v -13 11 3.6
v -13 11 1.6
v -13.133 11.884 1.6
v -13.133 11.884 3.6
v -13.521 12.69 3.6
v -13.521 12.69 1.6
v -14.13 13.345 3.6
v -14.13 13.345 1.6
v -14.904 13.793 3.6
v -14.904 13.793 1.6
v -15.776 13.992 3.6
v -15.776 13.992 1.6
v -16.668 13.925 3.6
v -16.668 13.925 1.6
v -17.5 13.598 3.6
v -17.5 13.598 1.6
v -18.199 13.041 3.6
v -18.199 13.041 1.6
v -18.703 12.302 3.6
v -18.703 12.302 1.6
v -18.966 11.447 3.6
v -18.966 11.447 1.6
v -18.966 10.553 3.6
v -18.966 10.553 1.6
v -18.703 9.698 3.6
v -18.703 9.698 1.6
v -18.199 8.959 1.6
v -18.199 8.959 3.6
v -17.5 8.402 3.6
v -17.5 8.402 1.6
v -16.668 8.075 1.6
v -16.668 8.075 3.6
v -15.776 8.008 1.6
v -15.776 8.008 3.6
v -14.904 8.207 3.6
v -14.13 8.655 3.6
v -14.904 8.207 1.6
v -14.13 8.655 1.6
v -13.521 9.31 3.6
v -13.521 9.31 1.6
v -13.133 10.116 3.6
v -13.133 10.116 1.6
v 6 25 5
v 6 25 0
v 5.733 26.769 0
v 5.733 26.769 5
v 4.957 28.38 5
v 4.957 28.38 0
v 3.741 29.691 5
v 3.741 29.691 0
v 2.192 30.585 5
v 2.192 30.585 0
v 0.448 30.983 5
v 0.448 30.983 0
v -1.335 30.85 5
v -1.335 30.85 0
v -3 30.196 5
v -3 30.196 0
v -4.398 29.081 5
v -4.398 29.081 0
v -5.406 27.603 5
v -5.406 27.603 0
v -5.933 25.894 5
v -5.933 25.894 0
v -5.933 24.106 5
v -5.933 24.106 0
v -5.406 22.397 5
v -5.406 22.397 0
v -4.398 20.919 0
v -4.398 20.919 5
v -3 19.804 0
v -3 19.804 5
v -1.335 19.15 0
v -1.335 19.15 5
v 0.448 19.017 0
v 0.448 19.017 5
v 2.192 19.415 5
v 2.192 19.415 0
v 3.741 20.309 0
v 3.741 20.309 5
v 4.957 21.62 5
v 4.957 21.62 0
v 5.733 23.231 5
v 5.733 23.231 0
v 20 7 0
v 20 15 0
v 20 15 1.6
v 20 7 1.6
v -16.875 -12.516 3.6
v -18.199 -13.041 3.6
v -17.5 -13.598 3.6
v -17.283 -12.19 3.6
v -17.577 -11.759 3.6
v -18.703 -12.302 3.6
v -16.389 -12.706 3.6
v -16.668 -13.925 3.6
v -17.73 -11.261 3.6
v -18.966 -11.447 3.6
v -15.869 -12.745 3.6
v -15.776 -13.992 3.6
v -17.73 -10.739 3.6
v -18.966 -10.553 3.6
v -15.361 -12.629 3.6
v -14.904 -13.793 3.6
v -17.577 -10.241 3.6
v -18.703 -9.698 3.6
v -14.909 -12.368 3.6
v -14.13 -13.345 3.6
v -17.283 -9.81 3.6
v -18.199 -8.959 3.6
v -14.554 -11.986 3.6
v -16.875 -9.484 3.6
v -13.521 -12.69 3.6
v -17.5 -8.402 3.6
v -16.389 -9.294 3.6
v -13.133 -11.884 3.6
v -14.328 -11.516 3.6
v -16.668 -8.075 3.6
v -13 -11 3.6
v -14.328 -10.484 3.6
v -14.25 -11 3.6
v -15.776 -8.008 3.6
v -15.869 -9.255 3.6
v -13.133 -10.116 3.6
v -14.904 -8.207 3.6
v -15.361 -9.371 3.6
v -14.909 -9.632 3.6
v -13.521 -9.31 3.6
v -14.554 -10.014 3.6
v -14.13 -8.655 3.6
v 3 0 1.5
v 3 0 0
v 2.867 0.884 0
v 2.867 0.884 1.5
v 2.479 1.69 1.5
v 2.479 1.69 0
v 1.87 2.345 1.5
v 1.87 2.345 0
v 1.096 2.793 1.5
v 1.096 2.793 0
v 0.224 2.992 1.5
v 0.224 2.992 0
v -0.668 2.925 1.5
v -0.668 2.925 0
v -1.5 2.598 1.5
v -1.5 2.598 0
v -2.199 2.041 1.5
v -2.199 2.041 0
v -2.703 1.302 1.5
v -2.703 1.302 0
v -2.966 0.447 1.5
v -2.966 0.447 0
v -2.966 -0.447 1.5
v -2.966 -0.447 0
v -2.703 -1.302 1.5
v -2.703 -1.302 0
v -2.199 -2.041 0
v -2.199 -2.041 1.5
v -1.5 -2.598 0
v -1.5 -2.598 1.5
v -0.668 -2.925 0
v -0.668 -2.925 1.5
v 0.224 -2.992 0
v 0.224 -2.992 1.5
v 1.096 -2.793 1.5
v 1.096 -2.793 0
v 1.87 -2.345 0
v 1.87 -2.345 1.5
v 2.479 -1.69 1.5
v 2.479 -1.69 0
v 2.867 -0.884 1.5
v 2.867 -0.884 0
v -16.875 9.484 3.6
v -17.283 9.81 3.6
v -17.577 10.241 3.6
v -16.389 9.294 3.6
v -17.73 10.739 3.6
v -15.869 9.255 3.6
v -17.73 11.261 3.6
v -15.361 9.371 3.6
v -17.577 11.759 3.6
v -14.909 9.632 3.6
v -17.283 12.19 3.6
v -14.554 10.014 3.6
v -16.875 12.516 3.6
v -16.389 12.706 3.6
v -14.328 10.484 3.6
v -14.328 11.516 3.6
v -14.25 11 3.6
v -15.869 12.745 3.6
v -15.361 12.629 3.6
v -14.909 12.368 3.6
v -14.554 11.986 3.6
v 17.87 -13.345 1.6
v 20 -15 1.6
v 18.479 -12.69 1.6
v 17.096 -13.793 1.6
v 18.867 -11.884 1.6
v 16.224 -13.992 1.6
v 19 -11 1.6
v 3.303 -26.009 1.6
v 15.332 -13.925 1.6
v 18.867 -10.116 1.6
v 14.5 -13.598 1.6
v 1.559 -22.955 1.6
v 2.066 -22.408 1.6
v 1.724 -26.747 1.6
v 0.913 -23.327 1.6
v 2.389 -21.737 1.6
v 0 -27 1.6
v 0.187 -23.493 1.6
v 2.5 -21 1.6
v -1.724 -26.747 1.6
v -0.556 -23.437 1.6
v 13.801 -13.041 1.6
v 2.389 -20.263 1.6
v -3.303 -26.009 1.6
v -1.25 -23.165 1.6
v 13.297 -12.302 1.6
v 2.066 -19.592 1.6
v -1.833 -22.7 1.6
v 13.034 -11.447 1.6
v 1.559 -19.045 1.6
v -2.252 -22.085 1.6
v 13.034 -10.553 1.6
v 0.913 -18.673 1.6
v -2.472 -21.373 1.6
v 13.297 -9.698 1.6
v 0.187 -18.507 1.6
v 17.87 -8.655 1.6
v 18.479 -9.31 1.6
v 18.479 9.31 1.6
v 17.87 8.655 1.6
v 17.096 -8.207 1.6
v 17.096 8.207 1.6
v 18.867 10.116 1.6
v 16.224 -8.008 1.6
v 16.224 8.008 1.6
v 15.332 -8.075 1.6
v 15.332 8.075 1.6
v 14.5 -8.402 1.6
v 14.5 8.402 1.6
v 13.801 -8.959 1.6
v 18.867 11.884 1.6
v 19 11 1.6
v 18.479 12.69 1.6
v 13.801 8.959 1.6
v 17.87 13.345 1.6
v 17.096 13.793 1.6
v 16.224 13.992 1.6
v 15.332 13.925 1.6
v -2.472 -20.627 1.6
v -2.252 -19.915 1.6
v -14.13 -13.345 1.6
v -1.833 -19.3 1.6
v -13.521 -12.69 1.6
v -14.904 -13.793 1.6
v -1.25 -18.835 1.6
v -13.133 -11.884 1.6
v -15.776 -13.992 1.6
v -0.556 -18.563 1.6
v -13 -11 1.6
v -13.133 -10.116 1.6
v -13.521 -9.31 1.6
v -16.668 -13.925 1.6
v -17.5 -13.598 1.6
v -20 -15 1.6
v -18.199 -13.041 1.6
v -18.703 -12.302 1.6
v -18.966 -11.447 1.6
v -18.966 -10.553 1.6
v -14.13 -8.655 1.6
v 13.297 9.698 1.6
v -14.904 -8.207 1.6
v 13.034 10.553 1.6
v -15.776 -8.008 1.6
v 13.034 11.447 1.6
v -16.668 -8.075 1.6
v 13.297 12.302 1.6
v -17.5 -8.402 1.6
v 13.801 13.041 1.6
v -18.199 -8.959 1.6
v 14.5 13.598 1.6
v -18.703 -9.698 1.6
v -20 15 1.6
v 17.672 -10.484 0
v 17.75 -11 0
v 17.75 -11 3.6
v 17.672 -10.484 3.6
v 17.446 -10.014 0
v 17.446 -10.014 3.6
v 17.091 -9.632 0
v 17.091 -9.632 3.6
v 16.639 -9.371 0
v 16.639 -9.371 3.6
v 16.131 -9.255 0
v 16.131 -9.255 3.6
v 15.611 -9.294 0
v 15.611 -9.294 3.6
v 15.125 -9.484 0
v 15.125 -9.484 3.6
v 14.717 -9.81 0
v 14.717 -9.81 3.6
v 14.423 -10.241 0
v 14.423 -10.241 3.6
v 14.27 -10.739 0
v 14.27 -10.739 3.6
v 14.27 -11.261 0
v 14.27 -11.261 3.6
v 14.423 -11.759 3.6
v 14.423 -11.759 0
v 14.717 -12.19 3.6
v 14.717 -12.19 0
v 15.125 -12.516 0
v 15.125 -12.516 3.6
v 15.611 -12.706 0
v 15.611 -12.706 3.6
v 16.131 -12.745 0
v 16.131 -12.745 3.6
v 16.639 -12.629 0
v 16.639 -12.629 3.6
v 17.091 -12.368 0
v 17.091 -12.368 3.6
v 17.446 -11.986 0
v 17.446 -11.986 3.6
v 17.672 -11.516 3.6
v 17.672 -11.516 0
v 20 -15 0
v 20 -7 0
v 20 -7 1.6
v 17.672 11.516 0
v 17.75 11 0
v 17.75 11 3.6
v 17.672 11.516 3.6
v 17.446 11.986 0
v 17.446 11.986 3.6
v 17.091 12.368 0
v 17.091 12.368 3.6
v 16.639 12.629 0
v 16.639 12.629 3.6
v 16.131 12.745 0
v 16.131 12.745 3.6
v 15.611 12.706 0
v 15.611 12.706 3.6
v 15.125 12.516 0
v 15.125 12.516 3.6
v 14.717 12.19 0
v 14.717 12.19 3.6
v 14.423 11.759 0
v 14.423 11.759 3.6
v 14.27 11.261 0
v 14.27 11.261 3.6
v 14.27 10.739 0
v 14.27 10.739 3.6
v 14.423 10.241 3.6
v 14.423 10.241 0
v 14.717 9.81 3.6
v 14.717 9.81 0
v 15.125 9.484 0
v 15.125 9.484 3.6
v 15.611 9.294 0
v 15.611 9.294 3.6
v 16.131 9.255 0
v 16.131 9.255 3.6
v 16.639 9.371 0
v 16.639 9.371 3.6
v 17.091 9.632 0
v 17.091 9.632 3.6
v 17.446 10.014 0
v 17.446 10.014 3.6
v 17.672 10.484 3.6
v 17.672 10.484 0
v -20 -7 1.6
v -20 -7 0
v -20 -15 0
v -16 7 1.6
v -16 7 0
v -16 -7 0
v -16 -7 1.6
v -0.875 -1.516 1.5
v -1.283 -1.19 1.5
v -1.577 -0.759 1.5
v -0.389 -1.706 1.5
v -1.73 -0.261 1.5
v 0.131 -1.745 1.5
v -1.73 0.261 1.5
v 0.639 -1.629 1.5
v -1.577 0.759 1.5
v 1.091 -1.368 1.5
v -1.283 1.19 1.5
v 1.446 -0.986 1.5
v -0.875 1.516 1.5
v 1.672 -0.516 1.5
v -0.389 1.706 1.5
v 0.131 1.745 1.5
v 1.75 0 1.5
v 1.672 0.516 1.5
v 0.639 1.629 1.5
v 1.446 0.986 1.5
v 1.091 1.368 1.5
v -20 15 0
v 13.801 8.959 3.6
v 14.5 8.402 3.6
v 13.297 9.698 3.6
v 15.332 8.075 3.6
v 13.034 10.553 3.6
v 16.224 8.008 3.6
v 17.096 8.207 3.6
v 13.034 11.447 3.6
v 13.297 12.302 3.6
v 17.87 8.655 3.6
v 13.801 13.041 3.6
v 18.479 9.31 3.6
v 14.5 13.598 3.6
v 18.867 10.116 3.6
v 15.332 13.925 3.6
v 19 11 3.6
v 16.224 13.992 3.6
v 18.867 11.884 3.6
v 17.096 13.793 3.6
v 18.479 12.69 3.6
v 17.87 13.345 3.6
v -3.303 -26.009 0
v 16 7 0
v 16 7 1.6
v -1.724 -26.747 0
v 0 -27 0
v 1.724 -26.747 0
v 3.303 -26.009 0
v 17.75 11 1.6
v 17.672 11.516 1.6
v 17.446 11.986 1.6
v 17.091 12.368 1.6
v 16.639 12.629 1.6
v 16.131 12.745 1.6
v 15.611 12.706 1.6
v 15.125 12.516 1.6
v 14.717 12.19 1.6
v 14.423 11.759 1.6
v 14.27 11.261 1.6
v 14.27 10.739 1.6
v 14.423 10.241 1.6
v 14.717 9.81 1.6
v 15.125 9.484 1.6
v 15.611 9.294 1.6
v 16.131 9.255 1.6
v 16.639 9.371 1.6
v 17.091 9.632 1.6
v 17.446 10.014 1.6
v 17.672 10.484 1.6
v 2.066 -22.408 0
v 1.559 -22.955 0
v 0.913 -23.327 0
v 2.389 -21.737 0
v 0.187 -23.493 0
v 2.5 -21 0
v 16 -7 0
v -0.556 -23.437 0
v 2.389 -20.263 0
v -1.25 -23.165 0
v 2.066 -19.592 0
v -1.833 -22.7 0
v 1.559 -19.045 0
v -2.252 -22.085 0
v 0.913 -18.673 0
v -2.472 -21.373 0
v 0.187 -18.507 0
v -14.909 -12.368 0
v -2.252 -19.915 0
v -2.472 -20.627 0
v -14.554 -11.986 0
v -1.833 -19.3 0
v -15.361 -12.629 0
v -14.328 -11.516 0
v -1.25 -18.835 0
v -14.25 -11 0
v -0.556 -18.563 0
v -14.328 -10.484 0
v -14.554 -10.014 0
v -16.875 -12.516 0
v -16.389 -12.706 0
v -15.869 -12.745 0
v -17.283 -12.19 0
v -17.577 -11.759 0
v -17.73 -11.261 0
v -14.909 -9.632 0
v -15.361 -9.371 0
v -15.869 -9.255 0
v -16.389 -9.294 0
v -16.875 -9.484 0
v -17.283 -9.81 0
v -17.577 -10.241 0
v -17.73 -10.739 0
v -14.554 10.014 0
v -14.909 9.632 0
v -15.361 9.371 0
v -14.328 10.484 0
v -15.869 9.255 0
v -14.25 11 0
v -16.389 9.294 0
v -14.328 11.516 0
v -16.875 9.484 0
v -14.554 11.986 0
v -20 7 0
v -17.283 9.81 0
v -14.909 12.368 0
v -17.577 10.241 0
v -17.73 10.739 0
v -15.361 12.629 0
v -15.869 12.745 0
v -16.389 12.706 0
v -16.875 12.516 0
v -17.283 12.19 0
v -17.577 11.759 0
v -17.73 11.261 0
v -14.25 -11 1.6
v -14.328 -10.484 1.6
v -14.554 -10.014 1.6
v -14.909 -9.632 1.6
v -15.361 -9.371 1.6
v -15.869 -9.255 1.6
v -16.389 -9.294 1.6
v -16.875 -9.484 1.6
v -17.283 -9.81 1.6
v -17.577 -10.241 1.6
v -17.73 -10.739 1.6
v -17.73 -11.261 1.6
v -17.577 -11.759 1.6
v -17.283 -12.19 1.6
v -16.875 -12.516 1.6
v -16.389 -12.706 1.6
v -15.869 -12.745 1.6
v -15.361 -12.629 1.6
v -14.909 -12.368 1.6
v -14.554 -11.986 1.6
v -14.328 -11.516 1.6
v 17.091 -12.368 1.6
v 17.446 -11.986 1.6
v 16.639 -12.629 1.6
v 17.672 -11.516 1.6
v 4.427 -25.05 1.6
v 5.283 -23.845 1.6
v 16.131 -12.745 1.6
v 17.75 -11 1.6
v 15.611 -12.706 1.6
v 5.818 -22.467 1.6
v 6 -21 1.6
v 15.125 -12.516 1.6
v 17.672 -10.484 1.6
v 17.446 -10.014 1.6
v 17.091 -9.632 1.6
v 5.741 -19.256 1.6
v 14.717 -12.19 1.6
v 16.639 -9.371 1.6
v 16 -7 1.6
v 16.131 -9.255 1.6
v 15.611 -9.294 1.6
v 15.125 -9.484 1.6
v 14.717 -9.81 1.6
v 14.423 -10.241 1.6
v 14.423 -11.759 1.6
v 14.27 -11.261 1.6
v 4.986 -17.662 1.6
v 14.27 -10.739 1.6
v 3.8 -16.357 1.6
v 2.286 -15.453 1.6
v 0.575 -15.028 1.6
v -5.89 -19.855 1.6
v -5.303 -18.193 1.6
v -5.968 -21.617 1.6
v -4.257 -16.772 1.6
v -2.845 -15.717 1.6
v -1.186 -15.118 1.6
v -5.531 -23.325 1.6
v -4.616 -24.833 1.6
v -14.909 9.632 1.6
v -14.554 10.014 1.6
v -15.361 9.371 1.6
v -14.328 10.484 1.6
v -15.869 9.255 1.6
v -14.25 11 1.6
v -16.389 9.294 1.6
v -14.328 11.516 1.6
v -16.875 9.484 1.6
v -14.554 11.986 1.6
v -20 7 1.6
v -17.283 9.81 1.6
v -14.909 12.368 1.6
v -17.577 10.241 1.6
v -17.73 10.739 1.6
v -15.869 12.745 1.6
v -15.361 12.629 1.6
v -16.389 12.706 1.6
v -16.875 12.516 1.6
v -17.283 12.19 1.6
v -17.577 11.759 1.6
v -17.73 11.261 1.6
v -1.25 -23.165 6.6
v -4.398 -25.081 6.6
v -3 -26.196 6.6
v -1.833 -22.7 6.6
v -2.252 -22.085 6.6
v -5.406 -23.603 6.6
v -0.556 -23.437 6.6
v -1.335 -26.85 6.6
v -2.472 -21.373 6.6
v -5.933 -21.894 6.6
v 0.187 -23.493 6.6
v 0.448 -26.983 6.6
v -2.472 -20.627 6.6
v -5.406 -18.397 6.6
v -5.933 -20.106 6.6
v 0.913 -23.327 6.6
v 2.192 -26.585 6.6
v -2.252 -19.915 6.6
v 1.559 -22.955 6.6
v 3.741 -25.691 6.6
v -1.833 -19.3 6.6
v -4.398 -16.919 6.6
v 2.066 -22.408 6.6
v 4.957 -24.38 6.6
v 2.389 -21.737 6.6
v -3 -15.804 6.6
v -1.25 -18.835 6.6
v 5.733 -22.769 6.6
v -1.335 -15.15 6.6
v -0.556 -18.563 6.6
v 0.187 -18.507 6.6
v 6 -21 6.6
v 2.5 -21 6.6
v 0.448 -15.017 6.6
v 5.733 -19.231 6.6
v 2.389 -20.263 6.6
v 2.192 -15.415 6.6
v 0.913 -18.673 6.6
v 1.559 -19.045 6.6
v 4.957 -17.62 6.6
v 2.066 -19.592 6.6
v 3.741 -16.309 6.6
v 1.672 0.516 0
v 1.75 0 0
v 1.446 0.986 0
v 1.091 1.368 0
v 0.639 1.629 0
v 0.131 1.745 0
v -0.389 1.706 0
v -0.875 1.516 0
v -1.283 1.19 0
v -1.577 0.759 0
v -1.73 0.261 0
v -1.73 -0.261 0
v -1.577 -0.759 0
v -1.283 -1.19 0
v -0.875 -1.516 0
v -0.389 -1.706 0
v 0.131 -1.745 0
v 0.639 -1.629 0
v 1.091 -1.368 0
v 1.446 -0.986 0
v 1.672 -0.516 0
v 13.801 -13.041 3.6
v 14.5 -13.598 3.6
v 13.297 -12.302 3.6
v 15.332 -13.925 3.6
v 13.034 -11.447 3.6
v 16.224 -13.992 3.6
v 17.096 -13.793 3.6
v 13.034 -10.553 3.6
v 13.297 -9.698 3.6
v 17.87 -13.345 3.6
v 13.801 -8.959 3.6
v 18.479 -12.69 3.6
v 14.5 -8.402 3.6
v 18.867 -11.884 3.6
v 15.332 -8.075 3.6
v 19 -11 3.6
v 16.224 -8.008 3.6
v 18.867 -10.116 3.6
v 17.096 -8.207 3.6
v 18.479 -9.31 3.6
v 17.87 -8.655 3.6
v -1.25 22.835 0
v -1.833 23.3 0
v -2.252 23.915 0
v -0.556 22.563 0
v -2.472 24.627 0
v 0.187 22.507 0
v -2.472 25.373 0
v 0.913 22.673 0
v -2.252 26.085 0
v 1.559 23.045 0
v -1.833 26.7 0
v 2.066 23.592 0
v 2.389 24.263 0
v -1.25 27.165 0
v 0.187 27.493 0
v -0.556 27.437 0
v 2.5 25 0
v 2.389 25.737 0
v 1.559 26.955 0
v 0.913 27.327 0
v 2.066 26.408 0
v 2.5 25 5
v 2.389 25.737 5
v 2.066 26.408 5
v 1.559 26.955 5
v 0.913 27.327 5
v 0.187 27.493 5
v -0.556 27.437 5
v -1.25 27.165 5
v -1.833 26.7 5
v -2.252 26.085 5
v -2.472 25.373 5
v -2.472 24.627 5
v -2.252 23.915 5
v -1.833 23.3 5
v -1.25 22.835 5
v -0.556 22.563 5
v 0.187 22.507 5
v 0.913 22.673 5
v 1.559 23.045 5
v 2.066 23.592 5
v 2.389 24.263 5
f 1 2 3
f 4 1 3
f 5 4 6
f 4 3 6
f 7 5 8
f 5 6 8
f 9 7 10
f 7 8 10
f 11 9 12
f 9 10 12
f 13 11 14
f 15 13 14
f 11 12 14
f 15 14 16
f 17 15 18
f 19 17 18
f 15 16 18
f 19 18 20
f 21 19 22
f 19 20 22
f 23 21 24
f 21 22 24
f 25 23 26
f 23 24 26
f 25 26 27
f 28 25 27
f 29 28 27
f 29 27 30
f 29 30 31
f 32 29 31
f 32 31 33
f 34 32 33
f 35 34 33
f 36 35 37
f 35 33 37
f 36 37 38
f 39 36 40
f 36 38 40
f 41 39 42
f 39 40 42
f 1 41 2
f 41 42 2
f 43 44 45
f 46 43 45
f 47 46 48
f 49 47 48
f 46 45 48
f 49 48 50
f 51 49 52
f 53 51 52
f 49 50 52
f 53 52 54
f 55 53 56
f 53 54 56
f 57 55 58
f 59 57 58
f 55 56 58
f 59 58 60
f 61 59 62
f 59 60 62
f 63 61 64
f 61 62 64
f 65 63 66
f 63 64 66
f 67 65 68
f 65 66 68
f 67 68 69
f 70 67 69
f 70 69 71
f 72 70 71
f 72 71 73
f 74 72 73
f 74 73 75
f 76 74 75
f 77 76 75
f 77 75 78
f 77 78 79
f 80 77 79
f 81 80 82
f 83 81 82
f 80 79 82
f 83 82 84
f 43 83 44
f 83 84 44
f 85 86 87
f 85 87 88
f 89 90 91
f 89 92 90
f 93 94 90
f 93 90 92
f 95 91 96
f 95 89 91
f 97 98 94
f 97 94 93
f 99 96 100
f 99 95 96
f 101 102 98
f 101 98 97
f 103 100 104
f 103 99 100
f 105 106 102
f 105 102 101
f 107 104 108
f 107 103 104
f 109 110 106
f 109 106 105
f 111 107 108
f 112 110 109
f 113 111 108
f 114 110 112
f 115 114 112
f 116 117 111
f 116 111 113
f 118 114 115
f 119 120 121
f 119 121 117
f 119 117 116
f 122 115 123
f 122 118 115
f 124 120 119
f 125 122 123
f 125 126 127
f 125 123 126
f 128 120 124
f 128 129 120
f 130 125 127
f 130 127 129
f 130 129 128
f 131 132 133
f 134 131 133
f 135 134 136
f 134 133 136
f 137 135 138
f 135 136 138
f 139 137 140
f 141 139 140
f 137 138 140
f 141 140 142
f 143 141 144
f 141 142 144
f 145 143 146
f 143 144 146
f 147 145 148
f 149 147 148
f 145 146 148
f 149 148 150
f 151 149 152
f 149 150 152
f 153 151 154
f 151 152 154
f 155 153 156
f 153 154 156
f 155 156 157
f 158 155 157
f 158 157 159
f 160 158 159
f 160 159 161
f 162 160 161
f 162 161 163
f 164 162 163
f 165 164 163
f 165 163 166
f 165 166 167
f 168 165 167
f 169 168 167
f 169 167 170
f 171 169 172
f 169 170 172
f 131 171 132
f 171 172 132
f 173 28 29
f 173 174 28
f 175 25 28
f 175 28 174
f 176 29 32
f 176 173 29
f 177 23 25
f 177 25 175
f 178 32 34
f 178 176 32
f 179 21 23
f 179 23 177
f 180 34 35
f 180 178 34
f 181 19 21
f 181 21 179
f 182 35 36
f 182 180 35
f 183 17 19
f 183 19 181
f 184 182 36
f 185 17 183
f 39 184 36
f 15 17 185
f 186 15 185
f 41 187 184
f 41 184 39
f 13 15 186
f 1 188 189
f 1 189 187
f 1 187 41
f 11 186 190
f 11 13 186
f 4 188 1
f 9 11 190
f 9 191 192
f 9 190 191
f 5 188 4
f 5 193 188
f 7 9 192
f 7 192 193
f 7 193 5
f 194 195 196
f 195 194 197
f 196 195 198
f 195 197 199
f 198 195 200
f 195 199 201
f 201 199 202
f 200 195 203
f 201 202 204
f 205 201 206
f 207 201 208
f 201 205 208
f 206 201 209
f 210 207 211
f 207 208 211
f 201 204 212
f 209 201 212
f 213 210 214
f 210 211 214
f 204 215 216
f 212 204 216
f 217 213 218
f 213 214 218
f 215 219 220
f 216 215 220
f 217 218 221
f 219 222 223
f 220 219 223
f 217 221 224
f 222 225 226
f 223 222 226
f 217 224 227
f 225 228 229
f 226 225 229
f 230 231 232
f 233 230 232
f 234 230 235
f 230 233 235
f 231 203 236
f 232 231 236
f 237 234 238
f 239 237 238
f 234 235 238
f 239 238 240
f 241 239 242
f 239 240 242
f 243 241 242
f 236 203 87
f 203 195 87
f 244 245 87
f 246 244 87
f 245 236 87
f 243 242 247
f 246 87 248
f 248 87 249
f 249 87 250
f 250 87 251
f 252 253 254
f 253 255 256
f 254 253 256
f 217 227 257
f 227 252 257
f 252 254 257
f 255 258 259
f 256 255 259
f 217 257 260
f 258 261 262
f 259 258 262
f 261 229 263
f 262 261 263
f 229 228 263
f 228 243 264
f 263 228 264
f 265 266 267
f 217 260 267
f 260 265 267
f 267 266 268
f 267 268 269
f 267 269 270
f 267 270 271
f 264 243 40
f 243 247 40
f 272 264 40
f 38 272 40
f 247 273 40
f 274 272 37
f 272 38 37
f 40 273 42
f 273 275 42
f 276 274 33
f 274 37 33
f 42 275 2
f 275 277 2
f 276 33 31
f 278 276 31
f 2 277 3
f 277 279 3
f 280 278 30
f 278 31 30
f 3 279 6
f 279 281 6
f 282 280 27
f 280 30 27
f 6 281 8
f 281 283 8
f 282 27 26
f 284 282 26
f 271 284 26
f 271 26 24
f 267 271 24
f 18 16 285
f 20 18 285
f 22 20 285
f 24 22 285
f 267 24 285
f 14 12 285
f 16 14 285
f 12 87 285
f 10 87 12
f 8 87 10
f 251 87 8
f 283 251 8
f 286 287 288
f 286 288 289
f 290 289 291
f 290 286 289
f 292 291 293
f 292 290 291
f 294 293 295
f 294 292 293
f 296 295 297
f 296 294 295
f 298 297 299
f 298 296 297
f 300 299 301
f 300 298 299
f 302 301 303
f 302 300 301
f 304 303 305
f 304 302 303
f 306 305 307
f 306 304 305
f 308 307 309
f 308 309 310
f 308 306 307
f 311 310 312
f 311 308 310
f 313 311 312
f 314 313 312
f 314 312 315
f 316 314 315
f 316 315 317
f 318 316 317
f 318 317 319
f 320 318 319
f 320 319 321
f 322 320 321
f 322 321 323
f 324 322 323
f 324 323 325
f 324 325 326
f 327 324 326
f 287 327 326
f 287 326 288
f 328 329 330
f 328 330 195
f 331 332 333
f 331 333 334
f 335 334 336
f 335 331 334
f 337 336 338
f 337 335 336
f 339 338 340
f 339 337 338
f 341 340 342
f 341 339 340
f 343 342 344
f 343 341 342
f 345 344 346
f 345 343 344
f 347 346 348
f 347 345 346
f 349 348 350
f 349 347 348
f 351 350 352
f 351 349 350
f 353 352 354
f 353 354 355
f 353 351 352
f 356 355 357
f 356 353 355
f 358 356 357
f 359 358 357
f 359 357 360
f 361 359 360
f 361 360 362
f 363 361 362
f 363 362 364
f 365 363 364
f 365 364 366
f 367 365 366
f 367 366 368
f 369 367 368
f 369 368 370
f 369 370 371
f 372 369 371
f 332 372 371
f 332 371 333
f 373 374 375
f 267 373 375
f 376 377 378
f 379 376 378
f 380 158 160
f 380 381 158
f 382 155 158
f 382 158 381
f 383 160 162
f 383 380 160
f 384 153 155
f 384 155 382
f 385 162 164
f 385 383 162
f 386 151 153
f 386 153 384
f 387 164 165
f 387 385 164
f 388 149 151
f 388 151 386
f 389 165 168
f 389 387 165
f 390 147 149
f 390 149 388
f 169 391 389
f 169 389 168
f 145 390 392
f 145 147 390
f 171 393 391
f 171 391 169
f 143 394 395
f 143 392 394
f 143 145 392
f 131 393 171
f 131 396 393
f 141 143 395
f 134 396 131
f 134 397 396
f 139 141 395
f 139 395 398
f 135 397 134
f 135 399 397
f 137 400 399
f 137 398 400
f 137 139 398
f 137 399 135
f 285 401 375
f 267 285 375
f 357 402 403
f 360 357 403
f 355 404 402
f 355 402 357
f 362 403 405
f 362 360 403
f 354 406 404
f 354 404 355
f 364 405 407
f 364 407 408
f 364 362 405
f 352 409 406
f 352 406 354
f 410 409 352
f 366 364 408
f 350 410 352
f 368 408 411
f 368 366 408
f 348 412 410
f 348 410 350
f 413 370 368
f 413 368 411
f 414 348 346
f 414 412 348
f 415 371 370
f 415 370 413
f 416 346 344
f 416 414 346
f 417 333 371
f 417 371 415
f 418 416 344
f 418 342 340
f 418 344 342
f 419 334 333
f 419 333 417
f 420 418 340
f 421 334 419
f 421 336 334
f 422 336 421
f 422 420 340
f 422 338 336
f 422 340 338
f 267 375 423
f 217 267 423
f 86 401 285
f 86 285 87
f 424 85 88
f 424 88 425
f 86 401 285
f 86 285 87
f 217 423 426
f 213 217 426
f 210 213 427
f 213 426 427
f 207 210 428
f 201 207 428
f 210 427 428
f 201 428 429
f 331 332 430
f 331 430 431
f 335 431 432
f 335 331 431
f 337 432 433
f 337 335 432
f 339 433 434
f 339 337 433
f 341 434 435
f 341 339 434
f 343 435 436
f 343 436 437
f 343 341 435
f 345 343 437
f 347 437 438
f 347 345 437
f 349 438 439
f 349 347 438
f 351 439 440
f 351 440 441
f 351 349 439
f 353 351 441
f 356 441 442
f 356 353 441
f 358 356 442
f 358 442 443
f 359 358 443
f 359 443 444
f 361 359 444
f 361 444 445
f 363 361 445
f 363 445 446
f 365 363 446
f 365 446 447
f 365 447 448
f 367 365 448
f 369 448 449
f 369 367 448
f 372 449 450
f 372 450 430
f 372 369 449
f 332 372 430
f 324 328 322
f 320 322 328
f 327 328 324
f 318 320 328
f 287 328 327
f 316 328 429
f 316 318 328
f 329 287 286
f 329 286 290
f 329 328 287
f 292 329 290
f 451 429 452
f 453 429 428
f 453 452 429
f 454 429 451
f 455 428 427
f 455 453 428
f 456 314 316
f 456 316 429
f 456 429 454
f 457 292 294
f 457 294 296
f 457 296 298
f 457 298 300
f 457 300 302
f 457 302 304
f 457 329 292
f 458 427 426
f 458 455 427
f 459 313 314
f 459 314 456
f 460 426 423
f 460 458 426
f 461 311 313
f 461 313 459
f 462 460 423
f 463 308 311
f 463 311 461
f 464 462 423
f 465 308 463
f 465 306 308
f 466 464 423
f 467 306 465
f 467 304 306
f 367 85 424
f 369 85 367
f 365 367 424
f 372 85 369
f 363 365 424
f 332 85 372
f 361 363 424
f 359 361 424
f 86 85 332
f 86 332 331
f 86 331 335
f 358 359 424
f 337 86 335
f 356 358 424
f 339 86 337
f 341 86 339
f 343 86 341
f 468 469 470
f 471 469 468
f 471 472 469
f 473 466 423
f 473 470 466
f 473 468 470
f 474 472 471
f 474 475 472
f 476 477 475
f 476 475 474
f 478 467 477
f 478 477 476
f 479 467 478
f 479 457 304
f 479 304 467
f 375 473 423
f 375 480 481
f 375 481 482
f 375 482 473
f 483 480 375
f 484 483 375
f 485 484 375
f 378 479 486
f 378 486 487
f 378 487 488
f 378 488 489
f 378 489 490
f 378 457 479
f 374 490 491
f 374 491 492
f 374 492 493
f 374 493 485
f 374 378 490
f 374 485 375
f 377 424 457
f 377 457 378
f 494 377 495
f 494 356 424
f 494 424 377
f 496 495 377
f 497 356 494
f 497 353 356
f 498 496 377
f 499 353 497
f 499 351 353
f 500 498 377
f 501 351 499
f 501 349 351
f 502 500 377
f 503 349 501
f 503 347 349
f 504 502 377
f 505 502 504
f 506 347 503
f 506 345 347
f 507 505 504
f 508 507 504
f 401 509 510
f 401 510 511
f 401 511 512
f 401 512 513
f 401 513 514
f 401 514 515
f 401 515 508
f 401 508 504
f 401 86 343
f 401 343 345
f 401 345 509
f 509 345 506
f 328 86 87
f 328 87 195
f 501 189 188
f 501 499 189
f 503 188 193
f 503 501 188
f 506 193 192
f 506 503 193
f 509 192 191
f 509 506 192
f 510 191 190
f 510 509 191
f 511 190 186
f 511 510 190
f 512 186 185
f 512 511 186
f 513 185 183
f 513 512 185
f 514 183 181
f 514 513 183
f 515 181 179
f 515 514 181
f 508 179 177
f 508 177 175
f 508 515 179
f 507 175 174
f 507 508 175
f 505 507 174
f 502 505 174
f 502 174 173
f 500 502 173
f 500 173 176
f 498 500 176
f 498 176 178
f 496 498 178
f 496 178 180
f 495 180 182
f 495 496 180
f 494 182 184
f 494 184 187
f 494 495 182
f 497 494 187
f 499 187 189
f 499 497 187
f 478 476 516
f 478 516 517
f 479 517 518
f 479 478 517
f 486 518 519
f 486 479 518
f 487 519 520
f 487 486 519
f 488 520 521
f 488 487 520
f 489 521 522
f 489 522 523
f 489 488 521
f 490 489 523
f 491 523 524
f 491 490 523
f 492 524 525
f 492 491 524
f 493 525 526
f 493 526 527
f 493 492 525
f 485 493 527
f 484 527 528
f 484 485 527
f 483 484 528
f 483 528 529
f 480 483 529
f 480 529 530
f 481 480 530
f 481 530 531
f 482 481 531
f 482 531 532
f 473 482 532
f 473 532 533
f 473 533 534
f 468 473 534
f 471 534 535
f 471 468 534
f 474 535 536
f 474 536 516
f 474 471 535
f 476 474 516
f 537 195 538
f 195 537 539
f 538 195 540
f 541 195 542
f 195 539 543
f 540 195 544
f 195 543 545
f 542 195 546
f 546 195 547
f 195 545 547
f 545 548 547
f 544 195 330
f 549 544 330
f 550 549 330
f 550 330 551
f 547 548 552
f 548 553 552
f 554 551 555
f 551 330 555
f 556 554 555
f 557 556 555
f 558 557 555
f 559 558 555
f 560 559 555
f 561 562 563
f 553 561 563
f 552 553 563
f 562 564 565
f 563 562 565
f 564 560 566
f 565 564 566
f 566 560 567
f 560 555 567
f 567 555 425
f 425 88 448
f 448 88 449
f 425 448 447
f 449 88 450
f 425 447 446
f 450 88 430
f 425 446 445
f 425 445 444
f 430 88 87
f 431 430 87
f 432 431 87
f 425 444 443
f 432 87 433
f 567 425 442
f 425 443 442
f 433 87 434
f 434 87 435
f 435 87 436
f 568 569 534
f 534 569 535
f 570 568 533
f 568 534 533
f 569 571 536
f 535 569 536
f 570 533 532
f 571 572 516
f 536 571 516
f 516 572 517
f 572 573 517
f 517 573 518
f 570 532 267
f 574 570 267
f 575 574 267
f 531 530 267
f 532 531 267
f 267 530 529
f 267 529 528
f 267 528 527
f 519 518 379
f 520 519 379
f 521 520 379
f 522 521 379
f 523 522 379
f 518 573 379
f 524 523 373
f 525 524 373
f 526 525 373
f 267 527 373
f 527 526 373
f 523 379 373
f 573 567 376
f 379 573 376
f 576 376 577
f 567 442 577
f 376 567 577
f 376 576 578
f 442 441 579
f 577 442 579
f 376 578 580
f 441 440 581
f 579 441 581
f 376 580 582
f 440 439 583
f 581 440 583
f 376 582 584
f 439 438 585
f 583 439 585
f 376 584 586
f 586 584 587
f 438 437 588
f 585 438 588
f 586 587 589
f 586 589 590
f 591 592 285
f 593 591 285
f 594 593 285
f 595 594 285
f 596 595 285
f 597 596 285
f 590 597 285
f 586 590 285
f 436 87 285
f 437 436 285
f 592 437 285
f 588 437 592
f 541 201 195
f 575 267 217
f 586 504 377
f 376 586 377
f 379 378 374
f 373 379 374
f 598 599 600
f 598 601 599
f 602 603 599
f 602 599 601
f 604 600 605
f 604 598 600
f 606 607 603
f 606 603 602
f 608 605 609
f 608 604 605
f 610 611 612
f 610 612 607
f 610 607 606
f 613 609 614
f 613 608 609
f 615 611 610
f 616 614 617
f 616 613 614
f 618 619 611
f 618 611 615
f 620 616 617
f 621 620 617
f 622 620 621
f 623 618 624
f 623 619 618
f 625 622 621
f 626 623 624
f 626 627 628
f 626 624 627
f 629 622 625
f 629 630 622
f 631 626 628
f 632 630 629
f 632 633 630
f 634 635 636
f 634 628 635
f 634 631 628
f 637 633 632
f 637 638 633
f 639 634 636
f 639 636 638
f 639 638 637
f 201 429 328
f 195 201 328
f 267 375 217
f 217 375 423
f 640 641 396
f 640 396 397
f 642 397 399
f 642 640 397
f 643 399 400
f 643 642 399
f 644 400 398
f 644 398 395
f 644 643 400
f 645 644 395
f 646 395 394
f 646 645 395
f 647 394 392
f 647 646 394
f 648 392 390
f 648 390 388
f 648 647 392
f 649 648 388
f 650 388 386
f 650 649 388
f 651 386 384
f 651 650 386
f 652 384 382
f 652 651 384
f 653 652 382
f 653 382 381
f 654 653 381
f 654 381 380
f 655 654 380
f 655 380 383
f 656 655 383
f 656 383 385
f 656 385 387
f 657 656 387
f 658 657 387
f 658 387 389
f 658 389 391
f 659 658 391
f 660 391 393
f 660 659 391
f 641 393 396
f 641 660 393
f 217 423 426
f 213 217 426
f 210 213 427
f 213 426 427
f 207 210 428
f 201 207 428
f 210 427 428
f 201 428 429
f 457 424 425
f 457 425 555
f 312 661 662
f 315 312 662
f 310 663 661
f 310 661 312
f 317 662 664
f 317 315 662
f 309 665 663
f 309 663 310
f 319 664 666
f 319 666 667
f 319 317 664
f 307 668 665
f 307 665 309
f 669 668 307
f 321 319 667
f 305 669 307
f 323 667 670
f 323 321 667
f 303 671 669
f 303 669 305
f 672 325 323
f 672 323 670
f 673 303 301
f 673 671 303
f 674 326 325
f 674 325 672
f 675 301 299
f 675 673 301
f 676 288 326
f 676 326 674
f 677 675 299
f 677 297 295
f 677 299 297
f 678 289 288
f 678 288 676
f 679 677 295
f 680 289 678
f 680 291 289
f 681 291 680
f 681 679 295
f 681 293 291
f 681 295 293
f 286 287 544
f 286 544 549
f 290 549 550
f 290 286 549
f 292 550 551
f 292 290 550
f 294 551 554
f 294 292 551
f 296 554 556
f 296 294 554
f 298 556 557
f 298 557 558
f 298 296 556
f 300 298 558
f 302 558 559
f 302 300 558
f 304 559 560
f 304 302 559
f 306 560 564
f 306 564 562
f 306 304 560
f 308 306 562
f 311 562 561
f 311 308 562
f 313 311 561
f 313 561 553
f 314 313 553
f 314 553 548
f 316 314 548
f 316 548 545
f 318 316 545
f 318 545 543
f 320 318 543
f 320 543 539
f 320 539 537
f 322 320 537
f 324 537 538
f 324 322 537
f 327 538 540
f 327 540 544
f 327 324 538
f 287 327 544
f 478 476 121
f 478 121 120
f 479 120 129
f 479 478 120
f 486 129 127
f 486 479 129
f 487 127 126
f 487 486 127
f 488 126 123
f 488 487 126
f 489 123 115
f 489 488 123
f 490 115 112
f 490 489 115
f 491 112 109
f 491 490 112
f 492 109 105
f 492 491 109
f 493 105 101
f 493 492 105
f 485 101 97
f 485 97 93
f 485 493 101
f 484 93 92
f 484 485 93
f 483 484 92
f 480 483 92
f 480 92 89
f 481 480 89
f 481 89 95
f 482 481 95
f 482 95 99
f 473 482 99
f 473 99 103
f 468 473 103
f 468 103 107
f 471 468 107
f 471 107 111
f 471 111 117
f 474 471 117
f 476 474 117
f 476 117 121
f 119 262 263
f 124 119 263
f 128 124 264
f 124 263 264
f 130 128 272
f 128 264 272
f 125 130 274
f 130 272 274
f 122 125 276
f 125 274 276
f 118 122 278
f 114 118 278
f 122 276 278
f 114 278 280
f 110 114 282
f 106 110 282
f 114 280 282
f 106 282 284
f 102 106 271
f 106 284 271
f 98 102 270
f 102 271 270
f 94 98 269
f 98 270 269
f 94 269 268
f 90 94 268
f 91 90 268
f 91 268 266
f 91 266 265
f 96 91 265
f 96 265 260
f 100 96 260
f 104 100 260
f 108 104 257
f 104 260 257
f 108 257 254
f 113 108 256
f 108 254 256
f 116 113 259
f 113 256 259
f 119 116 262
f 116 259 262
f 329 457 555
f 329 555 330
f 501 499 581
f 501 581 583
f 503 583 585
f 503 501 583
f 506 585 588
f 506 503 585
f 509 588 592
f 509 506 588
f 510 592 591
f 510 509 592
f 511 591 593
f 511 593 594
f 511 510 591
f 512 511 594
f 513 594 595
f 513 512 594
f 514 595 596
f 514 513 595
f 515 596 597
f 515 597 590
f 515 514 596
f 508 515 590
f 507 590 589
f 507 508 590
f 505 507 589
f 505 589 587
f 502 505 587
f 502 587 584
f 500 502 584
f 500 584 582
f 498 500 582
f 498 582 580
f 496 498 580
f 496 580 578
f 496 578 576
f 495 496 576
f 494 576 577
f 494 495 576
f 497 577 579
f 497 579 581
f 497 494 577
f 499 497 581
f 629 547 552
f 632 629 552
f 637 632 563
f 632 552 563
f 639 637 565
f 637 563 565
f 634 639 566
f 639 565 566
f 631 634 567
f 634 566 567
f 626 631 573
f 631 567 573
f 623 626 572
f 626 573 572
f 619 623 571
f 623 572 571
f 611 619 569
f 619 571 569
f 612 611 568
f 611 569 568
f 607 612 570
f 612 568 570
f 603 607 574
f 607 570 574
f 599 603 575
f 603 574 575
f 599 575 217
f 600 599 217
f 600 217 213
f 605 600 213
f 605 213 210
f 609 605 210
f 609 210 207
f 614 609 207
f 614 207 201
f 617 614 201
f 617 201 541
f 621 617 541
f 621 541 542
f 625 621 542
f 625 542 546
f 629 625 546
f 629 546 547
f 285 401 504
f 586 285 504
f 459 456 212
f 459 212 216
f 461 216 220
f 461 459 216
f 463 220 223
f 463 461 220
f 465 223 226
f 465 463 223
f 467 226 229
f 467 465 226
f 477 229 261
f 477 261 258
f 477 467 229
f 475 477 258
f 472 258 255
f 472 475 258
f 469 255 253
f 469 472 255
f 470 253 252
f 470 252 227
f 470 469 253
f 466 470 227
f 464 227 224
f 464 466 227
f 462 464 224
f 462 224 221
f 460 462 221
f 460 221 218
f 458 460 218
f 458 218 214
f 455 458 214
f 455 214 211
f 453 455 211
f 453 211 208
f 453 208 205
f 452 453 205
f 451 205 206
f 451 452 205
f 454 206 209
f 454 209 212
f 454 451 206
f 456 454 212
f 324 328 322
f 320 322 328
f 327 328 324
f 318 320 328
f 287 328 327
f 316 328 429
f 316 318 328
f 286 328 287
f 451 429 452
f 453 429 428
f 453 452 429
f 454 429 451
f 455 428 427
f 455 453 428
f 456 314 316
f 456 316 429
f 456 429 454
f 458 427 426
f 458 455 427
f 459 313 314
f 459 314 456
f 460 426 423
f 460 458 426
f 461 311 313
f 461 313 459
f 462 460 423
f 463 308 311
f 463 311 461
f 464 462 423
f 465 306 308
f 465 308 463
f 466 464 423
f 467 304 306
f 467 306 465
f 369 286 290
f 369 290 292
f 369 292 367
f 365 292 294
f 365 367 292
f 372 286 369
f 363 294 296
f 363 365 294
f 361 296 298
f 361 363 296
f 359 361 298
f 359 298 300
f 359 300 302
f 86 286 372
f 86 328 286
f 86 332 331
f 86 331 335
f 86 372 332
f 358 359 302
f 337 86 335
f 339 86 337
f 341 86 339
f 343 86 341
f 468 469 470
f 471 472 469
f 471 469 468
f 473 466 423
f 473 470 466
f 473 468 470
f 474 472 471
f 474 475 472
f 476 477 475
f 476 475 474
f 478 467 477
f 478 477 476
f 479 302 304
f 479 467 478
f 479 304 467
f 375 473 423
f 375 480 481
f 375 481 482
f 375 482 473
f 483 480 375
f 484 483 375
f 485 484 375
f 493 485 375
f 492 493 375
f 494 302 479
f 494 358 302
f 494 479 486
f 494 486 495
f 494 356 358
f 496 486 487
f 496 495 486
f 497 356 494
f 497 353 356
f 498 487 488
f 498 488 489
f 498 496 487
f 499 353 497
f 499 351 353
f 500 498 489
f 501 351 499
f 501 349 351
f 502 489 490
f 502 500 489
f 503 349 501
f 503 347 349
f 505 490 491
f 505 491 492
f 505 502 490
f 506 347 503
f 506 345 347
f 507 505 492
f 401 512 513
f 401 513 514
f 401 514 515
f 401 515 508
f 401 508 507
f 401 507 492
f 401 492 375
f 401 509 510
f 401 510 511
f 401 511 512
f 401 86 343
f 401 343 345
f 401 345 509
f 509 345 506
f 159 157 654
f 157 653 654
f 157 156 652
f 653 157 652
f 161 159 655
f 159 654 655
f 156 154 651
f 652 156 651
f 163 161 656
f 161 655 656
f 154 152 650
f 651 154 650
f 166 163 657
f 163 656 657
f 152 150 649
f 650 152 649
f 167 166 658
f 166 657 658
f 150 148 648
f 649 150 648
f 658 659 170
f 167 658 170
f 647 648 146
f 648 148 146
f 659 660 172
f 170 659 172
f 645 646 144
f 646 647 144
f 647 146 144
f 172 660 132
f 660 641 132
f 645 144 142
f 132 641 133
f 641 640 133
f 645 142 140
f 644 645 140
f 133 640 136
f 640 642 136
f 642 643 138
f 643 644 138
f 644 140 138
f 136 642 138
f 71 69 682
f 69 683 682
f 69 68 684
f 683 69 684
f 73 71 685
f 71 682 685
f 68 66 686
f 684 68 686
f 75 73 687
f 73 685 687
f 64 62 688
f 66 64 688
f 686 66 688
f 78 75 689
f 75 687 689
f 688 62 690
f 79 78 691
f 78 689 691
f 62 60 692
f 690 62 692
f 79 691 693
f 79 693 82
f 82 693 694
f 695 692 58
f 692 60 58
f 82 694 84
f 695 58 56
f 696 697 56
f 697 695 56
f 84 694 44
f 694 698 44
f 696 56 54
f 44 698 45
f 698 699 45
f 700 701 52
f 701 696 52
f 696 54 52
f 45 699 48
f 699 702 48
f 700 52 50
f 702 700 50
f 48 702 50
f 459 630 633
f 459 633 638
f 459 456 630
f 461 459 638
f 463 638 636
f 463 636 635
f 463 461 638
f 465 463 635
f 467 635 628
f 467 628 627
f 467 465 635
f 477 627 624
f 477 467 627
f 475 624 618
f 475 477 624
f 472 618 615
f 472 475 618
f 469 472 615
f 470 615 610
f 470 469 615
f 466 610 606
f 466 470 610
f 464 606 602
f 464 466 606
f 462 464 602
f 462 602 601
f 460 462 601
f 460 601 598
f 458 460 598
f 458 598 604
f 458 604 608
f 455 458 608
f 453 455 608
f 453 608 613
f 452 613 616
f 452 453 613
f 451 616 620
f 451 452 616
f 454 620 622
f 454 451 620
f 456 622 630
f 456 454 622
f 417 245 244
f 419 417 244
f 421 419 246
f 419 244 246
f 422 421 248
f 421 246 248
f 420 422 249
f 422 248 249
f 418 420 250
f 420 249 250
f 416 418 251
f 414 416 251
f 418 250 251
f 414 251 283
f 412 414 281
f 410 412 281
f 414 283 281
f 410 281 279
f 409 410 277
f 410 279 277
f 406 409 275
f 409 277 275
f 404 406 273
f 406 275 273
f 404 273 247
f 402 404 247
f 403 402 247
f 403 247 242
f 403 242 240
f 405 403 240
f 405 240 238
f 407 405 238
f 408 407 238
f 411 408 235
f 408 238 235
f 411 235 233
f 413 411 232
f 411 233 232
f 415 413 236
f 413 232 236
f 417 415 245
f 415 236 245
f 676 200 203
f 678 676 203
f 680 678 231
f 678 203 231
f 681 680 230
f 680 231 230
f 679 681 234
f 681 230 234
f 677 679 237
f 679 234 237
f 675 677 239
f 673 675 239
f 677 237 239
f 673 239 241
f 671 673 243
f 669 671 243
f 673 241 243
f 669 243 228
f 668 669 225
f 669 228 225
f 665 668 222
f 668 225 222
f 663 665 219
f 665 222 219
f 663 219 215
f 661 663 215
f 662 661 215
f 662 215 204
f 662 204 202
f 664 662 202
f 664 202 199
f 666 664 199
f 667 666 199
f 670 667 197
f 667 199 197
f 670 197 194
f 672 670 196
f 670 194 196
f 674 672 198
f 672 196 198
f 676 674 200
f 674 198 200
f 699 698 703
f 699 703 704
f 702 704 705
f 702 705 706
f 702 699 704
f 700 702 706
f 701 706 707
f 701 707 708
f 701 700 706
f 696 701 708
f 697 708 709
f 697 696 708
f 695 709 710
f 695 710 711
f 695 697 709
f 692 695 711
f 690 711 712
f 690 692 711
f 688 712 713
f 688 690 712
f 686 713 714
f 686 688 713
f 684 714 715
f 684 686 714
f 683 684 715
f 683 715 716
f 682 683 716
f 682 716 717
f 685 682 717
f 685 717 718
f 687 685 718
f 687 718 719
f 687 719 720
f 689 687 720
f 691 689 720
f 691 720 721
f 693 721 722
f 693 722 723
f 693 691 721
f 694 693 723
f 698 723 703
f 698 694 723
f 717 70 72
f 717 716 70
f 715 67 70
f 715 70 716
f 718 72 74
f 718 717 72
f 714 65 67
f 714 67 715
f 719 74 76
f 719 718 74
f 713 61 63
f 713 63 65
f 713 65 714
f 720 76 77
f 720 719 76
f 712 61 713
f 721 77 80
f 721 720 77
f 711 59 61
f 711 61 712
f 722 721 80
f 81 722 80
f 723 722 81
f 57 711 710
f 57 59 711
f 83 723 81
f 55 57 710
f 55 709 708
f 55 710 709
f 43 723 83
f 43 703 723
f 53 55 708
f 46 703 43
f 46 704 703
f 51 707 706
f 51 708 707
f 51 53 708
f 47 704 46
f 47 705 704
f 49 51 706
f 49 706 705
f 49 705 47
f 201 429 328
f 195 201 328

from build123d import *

# Parameters (mm, degrees)
SKETCH001_R   = 1.75
SKETCH001_R_2 = 2.5
PAD001_DEPTH  = 1.6
SKETCH002_R   = 3
SKETCH002_R_2 = 1.75
PAD002_DEPTH  = 2
SKETCH_R      = 1.75
SKETCH_R_2    = 2.5
PAD_DEPTH     = 1.6
SKETCH003_R   = 6
SKETCH003_R_2 = 2.5
PAD003_DEPTH  = 5
SKETCH004_R   = 6
SKETCH004_R_2 = 2.5
PAD004_DEPTH  = 5
SKETCH005_R   = 3
SKETCH005_R_2 = 1.75
PAD005_DEPTH  = 1.5


with BuildPart() as pad002:
    # Sketch001 → Pad001 (new body)
    with BuildSketch(Plane.XY):
        with BuildLine():
            Line((-20, 15), (20, 15))
            Line((20, 15), (20, -15))
            Line((3.3027522936, -26.0091743119), (20, -15))
            ThreePointArc((-3.3027522936, -26.0091743119), (0, -27), (3.3027522936, -26.0091743119))
            Line((-20, -15), (-3.3027522936, -26.0091743119))
            Line((-20, 15), (-20, -15))
        make_face()
        with Locations((-16, 11)):
            Circle(SKETCH001_R, mode=Mode.SUBTRACT)
        with Locations((16, 11)):
            Circle(SKETCH001_R, mode=Mode.SUBTRACT)
        with Locations((-16, -11)):
            Circle(SKETCH001_R, mode=Mode.SUBTRACT)
        with Locations((16, -11)):
            Circle(SKETCH001_R, mode=Mode.SUBTRACT)
        with Locations((0, -21)):
            Circle(SKETCH001_R_2, mode=Mode.SUBTRACT)
    extrude(amount=PAD001_DEPTH)

    # Sketch002 → Pad002 (new body)
    with BuildSketch(Plane.XY.offset(1.6)):
        with Locations((-16, 11)):
            Circle(SKETCH002_R)
        with Locations((-16, 11)):
            Circle(SKETCH002_R_2, mode=Mode.SUBTRACT)
        with Locations((16, 11)):
            Circle(SKETCH002_R)
        with Locations((16, 11)):
            Circle(SKETCH002_R_2, mode=Mode.SUBTRACT)
        with Locations((16, -11)):
            Circle(SKETCH002_R)
        with Locations((16, -11)):
            Circle(SKETCH002_R_2, mode=Mode.SUBTRACT)
        with Locations((-16, -11)):
            Circle(SKETCH002_R)
        with Locations((-16, -11)):
            Circle(SKETCH002_R_2, mode=Mode.SUBTRACT)
    extrude(amount=PAD002_DEPTH)


with BuildPart() as pad003:
    # Sketch → Pad (new body)
    with BuildSketch(Plane.XY):
        with BuildLine():
            Line((-20, 15), (20, 15))
            Line((20, 15), (20, 7))
            Line((20, 7), (16, 7))
            Line((16, 7), (16, -7))
            Line((16, -7), (20, -7))
            Line((20, -7), (20, -15))
            Line((3.3027522936, -26.0091743119), (20, -15))
            ThreePointArc((-3.3027522936, -26.0091743119), (0, -27), (3.3027522936, -26.0091743119))
            Line((-20, -15), (-3.3027522936, -26.009174312))
            Line((-20, -7), (-20, -15))
            Line((-16, -7), (-20, -7))
            Line((-16, 7), (-16, -7))
            Line((-20, 7), (-16, 7))
            Line((-20, 15), (-20, 7))
        make_face()
        with Locations((-16, 11)):
            Circle(SKETCH_R, mode=Mode.SUBTRACT)
        with Locations((16, 11)):
            Circle(SKETCH_R, mode=Mode.SUBTRACT)
        with Locations((-16, -11)):
            Circle(SKETCH_R, mode=Mode.SUBTRACT)
        with Locations((16, -11)):
            Circle(SKETCH_R, mode=Mode.SUBTRACT)
        with Locations((0, -21)):
            Circle(SKETCH_R_2, mode=Mode.SUBTRACT)
    extrude(amount=PAD_DEPTH)

    # Sketch003 → Pad003 (new body)
    with BuildSketch(Plane.XY.offset(1.6)):
        with Locations((0, -21)):
            Circle(SKETCH003_R)
        with Locations((0, -21)):
            Circle(SKETCH003_R_2, mode=Mode.SUBTRACT)
    extrude(amount=PAD003_DEPTH)


with BuildPart() as pad004:
    # Sketch004 → Pad004 (new body)
    with BuildSketch(Plane(origin=(0, 25, 0), x_dir=(1, 0, 0), z_dir=(0, 0, 1))):
        Circle(SKETCH004_R)
        Circle(SKETCH004_R_2, mode=Mode.SUBTRACT)
    extrude(amount=PAD004_DEPTH)


with BuildPart() as pad005:
    # Sketch005 → Pad005 (new body)
    with BuildSketch(Plane.XY):
        Circle(SKETCH005_R)
        Circle(SKETCH005_R_2, mode=Mode.SUBTRACT)
    extrude(amount=PAD005_DEPTH)


solid = Compound([pad002.part, pad003.part, pad004.part, pad005.part])
